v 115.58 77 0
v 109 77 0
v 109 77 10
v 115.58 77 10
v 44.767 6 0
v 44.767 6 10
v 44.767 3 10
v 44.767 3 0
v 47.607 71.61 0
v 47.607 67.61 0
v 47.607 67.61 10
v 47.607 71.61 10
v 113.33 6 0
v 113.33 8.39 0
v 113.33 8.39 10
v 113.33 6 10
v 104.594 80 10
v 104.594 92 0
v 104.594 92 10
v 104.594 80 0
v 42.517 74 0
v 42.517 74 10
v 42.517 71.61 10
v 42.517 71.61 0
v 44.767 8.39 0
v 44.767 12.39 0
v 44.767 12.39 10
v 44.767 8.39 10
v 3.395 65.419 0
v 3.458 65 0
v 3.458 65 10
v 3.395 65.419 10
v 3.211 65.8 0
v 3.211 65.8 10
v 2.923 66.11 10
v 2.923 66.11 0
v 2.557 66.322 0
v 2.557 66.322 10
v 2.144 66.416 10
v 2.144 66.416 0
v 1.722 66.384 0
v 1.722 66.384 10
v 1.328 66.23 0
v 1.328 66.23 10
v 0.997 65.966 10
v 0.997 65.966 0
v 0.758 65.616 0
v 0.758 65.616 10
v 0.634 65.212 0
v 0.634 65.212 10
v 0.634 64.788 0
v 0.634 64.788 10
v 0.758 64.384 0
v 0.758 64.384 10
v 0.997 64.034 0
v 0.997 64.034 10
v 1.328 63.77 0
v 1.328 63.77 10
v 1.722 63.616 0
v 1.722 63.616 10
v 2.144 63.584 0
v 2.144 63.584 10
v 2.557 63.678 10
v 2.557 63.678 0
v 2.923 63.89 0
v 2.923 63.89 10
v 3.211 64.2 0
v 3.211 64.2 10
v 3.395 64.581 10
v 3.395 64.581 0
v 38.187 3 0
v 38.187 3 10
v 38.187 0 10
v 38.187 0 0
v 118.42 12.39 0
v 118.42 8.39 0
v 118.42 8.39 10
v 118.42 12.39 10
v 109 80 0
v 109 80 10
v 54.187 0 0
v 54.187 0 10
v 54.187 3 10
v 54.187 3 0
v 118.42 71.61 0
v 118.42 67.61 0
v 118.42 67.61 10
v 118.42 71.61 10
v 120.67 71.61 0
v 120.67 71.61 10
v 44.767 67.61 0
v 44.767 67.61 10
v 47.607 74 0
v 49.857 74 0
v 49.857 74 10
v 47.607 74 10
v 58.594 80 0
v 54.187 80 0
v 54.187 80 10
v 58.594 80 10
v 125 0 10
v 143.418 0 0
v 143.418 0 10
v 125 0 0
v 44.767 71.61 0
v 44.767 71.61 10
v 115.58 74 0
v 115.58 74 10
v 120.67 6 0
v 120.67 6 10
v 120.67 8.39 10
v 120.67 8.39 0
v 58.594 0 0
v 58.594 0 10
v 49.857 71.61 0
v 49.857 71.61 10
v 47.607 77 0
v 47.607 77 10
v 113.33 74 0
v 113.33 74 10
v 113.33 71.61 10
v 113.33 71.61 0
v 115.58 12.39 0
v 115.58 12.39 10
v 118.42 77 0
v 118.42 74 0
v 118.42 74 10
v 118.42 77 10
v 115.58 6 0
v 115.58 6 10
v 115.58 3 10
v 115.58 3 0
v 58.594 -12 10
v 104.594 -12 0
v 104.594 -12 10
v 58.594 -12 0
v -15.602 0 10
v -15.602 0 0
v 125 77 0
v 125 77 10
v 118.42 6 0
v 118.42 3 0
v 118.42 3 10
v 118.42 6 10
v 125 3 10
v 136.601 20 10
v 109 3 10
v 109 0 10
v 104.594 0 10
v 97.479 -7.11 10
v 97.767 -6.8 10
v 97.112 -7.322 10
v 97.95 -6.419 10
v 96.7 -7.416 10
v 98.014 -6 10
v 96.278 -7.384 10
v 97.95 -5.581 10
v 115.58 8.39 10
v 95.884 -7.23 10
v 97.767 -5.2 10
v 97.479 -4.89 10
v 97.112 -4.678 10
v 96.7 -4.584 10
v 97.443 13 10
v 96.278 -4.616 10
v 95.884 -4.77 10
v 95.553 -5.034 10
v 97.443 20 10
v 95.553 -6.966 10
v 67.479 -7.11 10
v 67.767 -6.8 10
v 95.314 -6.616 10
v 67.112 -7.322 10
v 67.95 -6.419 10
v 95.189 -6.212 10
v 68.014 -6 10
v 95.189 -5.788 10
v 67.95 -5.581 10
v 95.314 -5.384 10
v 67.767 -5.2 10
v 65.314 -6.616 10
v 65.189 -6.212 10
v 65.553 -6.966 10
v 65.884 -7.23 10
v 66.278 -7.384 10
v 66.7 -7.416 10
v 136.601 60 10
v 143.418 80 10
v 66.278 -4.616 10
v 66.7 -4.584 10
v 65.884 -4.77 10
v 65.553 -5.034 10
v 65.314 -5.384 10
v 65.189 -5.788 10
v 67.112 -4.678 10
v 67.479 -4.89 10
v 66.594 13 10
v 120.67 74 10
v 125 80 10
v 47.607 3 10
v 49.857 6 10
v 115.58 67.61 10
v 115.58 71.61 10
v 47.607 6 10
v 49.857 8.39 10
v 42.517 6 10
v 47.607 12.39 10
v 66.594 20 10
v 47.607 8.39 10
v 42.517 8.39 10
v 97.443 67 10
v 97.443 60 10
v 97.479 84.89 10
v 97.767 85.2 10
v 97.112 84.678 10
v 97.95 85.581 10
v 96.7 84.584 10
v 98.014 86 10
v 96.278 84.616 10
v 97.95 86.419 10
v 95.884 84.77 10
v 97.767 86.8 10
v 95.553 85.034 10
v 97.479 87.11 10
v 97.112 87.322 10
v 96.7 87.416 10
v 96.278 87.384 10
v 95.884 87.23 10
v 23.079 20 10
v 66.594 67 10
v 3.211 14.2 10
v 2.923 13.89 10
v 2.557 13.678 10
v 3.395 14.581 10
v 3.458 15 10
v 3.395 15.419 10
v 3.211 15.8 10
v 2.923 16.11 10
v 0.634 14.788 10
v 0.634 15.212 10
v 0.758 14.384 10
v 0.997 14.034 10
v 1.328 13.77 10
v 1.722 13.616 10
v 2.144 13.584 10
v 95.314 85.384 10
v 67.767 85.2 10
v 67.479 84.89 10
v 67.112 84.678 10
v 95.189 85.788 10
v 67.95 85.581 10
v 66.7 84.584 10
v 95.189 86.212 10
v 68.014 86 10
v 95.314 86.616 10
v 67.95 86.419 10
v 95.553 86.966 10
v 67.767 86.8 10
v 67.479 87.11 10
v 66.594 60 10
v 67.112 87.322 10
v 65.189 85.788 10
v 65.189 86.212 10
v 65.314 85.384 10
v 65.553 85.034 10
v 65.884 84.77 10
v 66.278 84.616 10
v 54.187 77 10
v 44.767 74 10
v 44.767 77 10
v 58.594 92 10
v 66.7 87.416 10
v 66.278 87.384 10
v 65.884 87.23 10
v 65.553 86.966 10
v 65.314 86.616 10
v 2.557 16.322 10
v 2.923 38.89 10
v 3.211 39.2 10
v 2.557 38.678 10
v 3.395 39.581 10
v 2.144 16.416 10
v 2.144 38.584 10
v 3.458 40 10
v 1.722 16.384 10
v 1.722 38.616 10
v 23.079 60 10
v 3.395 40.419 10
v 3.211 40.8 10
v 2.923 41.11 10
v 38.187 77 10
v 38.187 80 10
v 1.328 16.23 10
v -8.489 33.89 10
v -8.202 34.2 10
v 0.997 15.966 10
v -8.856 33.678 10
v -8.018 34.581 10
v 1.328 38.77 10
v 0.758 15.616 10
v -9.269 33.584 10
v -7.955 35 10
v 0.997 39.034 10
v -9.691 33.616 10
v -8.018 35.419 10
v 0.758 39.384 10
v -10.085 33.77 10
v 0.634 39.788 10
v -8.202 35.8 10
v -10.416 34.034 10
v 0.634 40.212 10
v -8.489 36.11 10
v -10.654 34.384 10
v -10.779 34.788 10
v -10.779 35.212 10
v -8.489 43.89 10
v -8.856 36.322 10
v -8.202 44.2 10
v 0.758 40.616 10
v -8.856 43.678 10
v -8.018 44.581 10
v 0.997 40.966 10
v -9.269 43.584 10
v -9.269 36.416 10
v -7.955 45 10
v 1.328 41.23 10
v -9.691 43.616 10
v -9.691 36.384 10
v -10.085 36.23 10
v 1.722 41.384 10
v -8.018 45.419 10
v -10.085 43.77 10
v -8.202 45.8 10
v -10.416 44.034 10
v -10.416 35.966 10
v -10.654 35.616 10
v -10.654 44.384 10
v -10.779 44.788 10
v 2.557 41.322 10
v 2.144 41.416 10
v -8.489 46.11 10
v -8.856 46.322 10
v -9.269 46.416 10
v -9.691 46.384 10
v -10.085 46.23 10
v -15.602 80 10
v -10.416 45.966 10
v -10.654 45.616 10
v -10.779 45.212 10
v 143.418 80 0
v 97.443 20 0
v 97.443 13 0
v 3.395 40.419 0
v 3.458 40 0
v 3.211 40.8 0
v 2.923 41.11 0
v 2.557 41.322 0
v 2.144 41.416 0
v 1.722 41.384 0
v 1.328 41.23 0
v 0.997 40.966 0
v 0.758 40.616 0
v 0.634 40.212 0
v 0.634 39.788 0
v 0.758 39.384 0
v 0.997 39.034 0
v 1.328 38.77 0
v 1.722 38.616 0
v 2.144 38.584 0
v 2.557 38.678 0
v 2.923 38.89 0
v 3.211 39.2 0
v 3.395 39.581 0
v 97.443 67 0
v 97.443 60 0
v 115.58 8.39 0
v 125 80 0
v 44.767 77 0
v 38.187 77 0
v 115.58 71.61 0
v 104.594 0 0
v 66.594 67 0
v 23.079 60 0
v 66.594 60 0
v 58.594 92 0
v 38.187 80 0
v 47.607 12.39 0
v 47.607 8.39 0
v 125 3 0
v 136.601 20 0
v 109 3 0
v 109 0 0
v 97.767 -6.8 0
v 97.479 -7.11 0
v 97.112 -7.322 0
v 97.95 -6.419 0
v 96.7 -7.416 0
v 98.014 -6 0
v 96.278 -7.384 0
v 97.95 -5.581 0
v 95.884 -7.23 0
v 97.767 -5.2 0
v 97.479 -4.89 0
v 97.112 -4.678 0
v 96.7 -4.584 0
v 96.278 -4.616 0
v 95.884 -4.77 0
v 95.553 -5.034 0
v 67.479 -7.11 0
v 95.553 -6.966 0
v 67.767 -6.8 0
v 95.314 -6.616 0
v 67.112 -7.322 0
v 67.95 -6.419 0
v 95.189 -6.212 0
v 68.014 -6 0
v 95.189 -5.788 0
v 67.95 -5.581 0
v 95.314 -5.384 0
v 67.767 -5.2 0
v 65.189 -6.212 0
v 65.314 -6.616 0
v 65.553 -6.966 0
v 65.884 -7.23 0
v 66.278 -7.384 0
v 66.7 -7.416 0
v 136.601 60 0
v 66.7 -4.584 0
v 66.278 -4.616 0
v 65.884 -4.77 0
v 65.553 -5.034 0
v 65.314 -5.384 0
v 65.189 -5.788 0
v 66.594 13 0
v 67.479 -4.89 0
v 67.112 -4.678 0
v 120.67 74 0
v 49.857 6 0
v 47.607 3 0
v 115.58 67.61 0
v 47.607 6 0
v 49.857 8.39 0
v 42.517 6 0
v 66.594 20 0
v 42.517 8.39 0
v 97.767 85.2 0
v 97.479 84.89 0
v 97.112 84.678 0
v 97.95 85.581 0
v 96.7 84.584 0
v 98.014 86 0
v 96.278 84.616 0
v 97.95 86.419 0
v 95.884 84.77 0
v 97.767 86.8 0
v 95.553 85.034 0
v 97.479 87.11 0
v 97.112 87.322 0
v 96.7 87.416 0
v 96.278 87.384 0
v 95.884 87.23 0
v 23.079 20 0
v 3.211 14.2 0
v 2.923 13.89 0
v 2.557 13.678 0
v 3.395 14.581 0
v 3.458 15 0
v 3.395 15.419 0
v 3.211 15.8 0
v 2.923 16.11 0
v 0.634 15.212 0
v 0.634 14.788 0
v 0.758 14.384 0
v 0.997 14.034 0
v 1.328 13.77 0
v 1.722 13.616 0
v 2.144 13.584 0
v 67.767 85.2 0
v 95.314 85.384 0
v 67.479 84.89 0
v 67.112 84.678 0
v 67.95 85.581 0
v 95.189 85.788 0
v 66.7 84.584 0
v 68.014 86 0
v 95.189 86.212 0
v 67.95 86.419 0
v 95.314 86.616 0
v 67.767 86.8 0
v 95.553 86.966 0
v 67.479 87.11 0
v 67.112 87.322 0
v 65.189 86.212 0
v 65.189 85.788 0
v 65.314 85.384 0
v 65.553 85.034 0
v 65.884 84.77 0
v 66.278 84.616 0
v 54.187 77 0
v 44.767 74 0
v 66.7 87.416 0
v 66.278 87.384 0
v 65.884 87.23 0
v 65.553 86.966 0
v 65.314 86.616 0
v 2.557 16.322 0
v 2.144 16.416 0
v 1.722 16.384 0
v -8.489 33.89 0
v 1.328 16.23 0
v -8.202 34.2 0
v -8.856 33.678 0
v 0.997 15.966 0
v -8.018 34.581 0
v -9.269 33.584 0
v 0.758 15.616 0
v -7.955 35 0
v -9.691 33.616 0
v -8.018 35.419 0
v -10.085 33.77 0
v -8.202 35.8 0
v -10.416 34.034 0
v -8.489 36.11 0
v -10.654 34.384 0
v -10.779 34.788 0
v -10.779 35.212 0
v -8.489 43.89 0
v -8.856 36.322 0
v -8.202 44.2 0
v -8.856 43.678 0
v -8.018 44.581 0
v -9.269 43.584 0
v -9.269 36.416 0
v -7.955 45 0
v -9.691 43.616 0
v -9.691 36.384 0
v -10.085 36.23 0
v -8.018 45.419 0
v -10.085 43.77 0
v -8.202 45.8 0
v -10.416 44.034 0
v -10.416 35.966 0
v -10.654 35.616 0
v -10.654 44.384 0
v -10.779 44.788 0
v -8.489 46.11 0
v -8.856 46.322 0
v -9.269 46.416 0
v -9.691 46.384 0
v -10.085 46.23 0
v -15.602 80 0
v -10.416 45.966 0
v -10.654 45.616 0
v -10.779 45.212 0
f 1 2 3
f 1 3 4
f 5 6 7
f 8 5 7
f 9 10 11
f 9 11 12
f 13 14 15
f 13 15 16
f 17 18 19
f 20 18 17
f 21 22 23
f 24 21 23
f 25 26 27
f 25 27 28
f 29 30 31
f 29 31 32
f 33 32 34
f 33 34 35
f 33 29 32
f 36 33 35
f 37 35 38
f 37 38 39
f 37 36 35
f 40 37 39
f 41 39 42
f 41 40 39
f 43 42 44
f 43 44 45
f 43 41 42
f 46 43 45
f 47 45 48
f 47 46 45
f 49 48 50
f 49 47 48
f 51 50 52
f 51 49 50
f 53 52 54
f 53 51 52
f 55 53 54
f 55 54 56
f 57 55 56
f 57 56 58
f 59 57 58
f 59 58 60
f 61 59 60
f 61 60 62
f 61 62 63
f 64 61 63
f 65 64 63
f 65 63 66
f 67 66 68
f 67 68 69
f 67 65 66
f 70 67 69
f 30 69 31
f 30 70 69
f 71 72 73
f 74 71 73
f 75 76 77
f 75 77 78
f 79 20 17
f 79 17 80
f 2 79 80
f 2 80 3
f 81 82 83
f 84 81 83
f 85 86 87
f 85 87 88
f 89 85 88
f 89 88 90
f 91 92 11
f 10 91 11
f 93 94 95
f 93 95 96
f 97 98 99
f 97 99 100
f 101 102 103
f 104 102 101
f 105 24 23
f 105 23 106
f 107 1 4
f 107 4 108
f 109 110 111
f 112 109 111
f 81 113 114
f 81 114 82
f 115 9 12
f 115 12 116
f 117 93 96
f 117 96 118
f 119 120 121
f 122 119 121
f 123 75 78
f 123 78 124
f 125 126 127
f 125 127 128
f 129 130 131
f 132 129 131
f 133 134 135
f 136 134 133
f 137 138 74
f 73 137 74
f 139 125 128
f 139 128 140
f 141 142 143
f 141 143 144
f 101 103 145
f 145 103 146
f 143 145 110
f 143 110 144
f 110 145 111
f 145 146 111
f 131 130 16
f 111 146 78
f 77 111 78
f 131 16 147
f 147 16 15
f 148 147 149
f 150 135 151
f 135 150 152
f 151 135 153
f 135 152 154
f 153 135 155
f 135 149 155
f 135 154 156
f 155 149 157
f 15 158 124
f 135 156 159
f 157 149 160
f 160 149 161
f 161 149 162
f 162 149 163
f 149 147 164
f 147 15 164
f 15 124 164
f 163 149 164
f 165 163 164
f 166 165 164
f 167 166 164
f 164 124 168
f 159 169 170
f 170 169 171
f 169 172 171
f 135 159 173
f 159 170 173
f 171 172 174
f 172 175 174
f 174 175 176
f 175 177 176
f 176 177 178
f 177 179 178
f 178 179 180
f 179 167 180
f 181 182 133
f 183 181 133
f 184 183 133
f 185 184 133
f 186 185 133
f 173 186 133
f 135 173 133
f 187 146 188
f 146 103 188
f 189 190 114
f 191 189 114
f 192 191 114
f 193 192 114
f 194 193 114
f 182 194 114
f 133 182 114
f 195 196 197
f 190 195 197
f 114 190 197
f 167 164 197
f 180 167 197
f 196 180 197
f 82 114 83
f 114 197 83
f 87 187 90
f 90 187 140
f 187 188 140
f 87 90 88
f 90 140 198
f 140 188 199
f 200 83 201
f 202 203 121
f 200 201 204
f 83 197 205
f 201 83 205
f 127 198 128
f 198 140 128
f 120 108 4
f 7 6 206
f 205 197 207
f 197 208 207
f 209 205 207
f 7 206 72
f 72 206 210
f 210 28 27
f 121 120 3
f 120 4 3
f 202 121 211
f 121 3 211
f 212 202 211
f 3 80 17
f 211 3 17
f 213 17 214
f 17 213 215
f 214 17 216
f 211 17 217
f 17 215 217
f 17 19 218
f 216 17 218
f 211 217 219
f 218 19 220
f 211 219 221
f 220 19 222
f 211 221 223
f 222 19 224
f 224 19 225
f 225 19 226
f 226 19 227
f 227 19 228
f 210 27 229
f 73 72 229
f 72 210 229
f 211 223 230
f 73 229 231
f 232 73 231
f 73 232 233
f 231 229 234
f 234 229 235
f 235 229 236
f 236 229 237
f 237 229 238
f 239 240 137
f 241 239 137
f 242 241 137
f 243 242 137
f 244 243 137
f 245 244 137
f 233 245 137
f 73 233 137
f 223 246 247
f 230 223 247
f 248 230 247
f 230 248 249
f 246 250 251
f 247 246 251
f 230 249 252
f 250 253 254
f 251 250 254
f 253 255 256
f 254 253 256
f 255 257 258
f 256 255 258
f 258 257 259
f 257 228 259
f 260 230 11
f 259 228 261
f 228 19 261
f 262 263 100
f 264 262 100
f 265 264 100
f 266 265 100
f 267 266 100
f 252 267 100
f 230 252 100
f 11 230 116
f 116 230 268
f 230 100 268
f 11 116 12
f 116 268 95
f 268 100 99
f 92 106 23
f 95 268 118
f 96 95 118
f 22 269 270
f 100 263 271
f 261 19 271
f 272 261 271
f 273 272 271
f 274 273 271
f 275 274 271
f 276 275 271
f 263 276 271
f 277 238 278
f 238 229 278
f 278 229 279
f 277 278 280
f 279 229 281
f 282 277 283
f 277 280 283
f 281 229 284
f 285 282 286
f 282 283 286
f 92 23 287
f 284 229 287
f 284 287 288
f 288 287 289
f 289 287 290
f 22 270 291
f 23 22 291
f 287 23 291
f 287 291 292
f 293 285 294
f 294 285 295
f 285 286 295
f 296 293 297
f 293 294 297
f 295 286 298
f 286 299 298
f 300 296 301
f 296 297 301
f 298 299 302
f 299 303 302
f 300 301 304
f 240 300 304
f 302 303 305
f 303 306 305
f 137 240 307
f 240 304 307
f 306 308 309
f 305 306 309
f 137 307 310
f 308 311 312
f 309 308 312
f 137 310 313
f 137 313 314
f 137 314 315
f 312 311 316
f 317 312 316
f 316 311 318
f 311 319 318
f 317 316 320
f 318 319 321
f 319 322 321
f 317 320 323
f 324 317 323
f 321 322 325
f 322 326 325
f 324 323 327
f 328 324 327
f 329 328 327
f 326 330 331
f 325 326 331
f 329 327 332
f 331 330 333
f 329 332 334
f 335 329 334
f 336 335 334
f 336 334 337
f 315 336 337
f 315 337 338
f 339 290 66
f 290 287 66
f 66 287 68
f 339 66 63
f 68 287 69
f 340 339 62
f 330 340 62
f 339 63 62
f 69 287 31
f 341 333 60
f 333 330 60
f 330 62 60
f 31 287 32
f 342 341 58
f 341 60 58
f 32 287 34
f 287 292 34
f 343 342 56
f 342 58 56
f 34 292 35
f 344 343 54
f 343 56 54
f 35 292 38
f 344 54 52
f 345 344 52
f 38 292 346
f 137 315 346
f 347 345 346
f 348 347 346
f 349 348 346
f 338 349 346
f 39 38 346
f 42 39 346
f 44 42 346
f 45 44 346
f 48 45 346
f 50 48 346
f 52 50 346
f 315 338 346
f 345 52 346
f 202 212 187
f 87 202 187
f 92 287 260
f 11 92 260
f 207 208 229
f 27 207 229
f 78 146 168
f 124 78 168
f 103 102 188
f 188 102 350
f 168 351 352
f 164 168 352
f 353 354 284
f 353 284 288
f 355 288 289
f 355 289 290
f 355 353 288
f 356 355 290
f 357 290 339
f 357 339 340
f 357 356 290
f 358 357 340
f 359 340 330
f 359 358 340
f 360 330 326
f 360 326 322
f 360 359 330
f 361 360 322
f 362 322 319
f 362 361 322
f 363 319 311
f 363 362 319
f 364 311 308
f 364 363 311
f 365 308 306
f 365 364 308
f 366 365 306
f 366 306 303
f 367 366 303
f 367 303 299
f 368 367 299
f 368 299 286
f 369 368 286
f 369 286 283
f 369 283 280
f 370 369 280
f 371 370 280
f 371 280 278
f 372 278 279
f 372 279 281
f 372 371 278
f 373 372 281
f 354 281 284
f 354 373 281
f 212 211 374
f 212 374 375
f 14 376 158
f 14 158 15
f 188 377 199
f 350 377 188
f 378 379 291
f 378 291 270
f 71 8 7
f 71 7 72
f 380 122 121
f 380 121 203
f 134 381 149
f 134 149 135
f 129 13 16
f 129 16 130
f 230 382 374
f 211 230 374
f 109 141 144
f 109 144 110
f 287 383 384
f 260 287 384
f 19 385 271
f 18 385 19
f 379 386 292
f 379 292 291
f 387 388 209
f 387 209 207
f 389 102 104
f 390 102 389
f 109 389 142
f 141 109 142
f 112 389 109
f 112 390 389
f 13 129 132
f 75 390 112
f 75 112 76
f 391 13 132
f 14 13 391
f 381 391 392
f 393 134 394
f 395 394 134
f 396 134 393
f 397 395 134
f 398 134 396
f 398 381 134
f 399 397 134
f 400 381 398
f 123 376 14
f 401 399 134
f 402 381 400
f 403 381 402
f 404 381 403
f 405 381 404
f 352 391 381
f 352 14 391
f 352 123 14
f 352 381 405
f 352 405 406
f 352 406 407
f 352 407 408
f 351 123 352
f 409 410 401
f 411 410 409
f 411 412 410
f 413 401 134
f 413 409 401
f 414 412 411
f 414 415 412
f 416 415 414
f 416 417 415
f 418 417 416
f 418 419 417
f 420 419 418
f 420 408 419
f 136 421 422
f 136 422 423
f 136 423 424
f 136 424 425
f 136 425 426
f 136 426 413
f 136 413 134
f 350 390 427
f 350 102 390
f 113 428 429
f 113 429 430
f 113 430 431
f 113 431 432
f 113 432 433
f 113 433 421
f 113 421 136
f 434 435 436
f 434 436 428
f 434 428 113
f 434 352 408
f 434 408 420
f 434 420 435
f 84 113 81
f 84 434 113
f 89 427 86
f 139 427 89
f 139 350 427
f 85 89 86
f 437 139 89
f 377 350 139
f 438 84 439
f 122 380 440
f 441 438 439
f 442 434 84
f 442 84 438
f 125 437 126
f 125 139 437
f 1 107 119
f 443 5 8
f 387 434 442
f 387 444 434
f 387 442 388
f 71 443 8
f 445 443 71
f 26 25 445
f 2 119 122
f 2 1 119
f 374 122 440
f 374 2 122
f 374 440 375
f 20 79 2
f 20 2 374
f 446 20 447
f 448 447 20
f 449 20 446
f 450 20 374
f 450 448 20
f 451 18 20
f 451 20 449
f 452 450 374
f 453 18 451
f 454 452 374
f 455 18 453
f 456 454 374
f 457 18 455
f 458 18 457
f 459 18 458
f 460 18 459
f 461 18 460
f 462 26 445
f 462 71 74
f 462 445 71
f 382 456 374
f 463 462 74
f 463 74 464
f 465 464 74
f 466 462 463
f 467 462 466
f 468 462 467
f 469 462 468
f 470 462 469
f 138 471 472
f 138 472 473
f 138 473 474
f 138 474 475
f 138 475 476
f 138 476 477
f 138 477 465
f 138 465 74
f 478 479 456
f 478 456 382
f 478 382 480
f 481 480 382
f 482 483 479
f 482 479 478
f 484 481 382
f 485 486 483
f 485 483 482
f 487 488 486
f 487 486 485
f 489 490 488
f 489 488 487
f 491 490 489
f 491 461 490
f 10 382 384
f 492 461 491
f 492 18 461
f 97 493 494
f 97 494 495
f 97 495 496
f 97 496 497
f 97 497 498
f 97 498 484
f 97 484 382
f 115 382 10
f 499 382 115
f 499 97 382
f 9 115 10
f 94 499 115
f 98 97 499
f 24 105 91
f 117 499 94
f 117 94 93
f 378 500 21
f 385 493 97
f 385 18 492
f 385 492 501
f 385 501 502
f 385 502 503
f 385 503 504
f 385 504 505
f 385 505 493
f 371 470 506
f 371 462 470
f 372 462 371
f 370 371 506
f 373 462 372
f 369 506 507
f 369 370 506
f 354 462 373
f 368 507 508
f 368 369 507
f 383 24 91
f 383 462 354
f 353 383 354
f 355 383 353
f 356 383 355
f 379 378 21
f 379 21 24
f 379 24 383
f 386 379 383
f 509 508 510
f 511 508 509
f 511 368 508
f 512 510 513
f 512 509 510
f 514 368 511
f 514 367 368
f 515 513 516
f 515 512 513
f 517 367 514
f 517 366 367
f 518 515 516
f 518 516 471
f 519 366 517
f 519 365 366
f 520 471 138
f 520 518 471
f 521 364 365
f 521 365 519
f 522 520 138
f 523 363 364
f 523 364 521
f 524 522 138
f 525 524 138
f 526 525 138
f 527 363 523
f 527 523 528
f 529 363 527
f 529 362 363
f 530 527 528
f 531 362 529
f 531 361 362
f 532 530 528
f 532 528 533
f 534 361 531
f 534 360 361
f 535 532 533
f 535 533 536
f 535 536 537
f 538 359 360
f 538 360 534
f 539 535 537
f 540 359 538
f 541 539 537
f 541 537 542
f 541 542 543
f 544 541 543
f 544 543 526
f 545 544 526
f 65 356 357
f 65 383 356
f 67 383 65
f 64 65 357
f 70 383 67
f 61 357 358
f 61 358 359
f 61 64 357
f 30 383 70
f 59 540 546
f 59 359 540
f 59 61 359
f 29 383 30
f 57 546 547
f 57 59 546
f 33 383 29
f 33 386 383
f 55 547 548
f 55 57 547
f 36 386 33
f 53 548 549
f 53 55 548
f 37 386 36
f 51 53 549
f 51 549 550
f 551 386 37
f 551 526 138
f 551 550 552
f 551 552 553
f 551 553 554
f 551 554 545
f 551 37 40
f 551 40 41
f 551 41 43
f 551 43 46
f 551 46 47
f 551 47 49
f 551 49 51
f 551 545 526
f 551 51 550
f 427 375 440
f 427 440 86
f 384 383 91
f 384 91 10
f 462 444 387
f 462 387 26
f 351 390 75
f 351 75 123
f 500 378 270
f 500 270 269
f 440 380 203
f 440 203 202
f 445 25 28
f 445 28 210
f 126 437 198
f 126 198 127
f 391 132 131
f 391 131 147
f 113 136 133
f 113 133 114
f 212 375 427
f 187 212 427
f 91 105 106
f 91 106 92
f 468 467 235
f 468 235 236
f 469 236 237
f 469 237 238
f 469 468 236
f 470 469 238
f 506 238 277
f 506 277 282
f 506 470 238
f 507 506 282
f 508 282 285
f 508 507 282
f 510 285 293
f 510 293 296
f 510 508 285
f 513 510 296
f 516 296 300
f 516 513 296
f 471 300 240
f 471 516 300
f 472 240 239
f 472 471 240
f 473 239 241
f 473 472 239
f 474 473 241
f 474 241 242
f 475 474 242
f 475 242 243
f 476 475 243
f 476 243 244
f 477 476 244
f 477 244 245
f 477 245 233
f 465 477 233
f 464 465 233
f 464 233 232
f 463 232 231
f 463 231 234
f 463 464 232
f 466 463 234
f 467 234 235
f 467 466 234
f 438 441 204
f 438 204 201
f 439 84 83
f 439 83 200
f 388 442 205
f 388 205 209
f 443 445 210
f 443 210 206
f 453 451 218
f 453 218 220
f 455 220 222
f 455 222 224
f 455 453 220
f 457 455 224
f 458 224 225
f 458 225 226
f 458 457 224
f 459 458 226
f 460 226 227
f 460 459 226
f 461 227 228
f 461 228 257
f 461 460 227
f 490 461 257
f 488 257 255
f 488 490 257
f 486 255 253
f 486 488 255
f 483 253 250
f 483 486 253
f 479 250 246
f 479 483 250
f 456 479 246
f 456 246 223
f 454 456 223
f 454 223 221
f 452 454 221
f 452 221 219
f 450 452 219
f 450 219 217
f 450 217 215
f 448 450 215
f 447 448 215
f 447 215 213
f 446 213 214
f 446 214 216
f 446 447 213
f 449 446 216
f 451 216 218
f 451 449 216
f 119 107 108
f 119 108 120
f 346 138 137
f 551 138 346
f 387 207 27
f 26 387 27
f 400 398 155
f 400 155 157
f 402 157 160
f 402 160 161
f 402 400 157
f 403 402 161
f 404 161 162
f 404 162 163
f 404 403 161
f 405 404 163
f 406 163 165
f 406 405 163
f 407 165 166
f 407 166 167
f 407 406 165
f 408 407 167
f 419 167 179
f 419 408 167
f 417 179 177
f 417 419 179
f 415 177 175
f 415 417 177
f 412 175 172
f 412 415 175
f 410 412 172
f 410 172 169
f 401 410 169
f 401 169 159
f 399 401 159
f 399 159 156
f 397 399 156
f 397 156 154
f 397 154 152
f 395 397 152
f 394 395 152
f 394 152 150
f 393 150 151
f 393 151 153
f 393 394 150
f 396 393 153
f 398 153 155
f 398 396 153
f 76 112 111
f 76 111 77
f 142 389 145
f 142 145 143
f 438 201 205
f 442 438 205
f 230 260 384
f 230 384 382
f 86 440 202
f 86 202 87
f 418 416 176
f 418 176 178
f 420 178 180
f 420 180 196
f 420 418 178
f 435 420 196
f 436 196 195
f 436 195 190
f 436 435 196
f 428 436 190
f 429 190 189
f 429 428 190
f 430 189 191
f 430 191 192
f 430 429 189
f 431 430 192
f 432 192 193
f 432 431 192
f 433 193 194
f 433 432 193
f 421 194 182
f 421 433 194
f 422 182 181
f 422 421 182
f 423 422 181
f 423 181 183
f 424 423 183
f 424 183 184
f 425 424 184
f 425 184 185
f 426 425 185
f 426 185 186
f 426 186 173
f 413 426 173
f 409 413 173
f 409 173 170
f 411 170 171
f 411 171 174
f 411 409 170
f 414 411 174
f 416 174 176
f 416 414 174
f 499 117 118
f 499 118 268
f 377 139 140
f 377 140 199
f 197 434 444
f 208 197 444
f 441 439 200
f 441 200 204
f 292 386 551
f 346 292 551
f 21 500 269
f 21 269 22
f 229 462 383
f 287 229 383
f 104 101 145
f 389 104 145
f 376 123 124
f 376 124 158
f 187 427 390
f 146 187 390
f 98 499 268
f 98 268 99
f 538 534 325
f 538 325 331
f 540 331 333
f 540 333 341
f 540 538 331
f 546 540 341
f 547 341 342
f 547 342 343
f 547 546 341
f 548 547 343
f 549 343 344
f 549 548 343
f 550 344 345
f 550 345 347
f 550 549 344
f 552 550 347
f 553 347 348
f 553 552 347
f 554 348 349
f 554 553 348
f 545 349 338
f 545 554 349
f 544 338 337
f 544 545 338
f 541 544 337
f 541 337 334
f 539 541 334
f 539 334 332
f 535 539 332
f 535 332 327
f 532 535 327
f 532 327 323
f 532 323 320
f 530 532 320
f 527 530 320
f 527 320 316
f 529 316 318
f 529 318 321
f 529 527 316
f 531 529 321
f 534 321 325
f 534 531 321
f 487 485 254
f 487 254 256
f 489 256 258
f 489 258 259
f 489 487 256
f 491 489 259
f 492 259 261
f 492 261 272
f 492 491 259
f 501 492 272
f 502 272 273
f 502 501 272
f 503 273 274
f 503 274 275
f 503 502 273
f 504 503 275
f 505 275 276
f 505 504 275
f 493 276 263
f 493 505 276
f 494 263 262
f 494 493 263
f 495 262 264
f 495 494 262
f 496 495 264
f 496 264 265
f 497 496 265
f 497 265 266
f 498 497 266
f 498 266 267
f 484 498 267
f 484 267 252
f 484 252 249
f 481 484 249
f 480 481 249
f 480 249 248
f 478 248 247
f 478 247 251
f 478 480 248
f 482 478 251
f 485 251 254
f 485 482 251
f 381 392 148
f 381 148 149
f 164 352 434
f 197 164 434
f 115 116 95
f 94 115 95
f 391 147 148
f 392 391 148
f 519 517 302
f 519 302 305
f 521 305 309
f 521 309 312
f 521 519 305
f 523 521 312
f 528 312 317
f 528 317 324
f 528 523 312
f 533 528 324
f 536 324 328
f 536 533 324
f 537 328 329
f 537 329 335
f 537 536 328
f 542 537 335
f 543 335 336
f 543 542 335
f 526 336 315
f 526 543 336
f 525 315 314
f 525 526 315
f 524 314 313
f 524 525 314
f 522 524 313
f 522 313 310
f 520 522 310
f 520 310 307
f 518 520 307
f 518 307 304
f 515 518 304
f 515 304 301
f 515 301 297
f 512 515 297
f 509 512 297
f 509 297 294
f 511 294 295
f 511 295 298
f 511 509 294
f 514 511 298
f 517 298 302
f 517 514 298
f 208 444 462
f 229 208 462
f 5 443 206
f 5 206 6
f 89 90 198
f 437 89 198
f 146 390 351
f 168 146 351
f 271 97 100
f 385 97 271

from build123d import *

# Parameters (mm, degrees)
SKETCH1_R           = 1.42
BOSS_EXTRUDE1_DEPTH = 10


with BuildPart() as part:
    # Sketch1 → Boss-Extrude1 (new body)
    with BuildSketch(Plane.XY):
        Polygon((109, 80), (109, 77), (115.58, 77), (115.58, 74), (113.33, 74), (113.33, 71.61), (115.58, 71.61), (115.58, 67.61), (118.42, 67.61), (118.42, 71.61), (120.67, 71.61), (120.67, 74), (118.42, 74), (118.42, 77), (125, 77), (125, 80), (143.417515172, 80), (143.417515172, 60), (143.417515172, 20), (143.417515172, 0), (125, 0), (125, 3), (118.42, 3), (118.42, 6), (120.67, 6), (120.67, 8.39), (118.42, 8.39), (118.42, 12.39), (115.58, 12.39), (115.58, 8.39), (113.33, 8.39), (113.33, 6), (115.58, 6), (115.58, 3), (109, 3), (109, 0), (104.593570259, 0), (104.593570259, -12), (58.593570259, -12), (58.593570259, 0), (54.187140517, 0), (54.187140517, 3), (47.607140517, 3), (47.607140517, 6), (49.857140517, 6), (49.857140517, 8.39), (47.607140517, 8.39), (47.607140517, 12.39), (44.767140517, 12.39), (44.767140517, 8.39), (42.517140517, 8.39), (42.517140517, 6), (44.767140517, 6), (44.767140517, 3), (38.187140517, 3), (38.187140517, 0), (0, 0), (-15.602079829, 0), (-15.602079829, 80), (5, 80), (38.187140517, 80), (38.187140517, 77), (44.767140517, 77), (44.767140517, 74), (42.517140517, 74), (42.517140517, 71.61), (44.767140517, 71.61), (44.767140517, 67.61), (47.607140517, 67.61), (47.607140517, 71.61), (49.857140517, 71.61), (49.857140517, 74), (47.607140517, 74), (47.607140517, 77), (54.187140517, 77), (54.187140517, 80), (58.593570259, 80), (58.593570259, 92), (104.593570259, 92), (104.593570259, 80), align=None)
        with Locations((2.037759908, 40)):
            Circle(SKETCH1_R, mode=Mode.SUBTRACT)
        with Locations((2.037759908, 65)):
            Circle(SKETCH1_R, mode=Mode.SUBTRACT)
        with Locations((2.037759908, 15)):
            Circle(SKETCH1_R, mode=Mode.SUBTRACT)
        with Locations((66.593570259, 86)):
            Circle(SKETCH1_R, mode=Mode.SUBTRACT)
        with Locations((96.593570259, 86)):
            Circle(SKETCH1_R, mode=Mode.SUBTRACT)
        with Locations((96.593570259, -6)):
            Circle(SKETCH1_R, mode=Mode.SUBTRACT)
        with Locations((66.593570259, -6)):
            Circle(SKETCH1_R, mode=Mode.SUBTRACT)
        with Locations((-9.374764666, 45)):
            Circle(SKETCH1_R, mode=Mode.SUBTRACT)
        with Locations((-9.374764666, 35)):
            Circle(SKETCH1_R, mode=Mode.SUBTRACT)
        Polygon((136.600558962, 60), (136.600558962, 20), (97.442765105, 20), (97.442765105, 13), (66.593570259, 13), (66.593570259, 20), (23.079003763, 20), (23.079003763, 60), (66.593570259, 60), (66.593570259, 67), (97.442765105, 67), (97.442765105, 60), align=None, mode=Mode.SUBTRACT)
    extrude(amount=BOSS_EXTRUDE1_DEPTH)


solid = part.part
